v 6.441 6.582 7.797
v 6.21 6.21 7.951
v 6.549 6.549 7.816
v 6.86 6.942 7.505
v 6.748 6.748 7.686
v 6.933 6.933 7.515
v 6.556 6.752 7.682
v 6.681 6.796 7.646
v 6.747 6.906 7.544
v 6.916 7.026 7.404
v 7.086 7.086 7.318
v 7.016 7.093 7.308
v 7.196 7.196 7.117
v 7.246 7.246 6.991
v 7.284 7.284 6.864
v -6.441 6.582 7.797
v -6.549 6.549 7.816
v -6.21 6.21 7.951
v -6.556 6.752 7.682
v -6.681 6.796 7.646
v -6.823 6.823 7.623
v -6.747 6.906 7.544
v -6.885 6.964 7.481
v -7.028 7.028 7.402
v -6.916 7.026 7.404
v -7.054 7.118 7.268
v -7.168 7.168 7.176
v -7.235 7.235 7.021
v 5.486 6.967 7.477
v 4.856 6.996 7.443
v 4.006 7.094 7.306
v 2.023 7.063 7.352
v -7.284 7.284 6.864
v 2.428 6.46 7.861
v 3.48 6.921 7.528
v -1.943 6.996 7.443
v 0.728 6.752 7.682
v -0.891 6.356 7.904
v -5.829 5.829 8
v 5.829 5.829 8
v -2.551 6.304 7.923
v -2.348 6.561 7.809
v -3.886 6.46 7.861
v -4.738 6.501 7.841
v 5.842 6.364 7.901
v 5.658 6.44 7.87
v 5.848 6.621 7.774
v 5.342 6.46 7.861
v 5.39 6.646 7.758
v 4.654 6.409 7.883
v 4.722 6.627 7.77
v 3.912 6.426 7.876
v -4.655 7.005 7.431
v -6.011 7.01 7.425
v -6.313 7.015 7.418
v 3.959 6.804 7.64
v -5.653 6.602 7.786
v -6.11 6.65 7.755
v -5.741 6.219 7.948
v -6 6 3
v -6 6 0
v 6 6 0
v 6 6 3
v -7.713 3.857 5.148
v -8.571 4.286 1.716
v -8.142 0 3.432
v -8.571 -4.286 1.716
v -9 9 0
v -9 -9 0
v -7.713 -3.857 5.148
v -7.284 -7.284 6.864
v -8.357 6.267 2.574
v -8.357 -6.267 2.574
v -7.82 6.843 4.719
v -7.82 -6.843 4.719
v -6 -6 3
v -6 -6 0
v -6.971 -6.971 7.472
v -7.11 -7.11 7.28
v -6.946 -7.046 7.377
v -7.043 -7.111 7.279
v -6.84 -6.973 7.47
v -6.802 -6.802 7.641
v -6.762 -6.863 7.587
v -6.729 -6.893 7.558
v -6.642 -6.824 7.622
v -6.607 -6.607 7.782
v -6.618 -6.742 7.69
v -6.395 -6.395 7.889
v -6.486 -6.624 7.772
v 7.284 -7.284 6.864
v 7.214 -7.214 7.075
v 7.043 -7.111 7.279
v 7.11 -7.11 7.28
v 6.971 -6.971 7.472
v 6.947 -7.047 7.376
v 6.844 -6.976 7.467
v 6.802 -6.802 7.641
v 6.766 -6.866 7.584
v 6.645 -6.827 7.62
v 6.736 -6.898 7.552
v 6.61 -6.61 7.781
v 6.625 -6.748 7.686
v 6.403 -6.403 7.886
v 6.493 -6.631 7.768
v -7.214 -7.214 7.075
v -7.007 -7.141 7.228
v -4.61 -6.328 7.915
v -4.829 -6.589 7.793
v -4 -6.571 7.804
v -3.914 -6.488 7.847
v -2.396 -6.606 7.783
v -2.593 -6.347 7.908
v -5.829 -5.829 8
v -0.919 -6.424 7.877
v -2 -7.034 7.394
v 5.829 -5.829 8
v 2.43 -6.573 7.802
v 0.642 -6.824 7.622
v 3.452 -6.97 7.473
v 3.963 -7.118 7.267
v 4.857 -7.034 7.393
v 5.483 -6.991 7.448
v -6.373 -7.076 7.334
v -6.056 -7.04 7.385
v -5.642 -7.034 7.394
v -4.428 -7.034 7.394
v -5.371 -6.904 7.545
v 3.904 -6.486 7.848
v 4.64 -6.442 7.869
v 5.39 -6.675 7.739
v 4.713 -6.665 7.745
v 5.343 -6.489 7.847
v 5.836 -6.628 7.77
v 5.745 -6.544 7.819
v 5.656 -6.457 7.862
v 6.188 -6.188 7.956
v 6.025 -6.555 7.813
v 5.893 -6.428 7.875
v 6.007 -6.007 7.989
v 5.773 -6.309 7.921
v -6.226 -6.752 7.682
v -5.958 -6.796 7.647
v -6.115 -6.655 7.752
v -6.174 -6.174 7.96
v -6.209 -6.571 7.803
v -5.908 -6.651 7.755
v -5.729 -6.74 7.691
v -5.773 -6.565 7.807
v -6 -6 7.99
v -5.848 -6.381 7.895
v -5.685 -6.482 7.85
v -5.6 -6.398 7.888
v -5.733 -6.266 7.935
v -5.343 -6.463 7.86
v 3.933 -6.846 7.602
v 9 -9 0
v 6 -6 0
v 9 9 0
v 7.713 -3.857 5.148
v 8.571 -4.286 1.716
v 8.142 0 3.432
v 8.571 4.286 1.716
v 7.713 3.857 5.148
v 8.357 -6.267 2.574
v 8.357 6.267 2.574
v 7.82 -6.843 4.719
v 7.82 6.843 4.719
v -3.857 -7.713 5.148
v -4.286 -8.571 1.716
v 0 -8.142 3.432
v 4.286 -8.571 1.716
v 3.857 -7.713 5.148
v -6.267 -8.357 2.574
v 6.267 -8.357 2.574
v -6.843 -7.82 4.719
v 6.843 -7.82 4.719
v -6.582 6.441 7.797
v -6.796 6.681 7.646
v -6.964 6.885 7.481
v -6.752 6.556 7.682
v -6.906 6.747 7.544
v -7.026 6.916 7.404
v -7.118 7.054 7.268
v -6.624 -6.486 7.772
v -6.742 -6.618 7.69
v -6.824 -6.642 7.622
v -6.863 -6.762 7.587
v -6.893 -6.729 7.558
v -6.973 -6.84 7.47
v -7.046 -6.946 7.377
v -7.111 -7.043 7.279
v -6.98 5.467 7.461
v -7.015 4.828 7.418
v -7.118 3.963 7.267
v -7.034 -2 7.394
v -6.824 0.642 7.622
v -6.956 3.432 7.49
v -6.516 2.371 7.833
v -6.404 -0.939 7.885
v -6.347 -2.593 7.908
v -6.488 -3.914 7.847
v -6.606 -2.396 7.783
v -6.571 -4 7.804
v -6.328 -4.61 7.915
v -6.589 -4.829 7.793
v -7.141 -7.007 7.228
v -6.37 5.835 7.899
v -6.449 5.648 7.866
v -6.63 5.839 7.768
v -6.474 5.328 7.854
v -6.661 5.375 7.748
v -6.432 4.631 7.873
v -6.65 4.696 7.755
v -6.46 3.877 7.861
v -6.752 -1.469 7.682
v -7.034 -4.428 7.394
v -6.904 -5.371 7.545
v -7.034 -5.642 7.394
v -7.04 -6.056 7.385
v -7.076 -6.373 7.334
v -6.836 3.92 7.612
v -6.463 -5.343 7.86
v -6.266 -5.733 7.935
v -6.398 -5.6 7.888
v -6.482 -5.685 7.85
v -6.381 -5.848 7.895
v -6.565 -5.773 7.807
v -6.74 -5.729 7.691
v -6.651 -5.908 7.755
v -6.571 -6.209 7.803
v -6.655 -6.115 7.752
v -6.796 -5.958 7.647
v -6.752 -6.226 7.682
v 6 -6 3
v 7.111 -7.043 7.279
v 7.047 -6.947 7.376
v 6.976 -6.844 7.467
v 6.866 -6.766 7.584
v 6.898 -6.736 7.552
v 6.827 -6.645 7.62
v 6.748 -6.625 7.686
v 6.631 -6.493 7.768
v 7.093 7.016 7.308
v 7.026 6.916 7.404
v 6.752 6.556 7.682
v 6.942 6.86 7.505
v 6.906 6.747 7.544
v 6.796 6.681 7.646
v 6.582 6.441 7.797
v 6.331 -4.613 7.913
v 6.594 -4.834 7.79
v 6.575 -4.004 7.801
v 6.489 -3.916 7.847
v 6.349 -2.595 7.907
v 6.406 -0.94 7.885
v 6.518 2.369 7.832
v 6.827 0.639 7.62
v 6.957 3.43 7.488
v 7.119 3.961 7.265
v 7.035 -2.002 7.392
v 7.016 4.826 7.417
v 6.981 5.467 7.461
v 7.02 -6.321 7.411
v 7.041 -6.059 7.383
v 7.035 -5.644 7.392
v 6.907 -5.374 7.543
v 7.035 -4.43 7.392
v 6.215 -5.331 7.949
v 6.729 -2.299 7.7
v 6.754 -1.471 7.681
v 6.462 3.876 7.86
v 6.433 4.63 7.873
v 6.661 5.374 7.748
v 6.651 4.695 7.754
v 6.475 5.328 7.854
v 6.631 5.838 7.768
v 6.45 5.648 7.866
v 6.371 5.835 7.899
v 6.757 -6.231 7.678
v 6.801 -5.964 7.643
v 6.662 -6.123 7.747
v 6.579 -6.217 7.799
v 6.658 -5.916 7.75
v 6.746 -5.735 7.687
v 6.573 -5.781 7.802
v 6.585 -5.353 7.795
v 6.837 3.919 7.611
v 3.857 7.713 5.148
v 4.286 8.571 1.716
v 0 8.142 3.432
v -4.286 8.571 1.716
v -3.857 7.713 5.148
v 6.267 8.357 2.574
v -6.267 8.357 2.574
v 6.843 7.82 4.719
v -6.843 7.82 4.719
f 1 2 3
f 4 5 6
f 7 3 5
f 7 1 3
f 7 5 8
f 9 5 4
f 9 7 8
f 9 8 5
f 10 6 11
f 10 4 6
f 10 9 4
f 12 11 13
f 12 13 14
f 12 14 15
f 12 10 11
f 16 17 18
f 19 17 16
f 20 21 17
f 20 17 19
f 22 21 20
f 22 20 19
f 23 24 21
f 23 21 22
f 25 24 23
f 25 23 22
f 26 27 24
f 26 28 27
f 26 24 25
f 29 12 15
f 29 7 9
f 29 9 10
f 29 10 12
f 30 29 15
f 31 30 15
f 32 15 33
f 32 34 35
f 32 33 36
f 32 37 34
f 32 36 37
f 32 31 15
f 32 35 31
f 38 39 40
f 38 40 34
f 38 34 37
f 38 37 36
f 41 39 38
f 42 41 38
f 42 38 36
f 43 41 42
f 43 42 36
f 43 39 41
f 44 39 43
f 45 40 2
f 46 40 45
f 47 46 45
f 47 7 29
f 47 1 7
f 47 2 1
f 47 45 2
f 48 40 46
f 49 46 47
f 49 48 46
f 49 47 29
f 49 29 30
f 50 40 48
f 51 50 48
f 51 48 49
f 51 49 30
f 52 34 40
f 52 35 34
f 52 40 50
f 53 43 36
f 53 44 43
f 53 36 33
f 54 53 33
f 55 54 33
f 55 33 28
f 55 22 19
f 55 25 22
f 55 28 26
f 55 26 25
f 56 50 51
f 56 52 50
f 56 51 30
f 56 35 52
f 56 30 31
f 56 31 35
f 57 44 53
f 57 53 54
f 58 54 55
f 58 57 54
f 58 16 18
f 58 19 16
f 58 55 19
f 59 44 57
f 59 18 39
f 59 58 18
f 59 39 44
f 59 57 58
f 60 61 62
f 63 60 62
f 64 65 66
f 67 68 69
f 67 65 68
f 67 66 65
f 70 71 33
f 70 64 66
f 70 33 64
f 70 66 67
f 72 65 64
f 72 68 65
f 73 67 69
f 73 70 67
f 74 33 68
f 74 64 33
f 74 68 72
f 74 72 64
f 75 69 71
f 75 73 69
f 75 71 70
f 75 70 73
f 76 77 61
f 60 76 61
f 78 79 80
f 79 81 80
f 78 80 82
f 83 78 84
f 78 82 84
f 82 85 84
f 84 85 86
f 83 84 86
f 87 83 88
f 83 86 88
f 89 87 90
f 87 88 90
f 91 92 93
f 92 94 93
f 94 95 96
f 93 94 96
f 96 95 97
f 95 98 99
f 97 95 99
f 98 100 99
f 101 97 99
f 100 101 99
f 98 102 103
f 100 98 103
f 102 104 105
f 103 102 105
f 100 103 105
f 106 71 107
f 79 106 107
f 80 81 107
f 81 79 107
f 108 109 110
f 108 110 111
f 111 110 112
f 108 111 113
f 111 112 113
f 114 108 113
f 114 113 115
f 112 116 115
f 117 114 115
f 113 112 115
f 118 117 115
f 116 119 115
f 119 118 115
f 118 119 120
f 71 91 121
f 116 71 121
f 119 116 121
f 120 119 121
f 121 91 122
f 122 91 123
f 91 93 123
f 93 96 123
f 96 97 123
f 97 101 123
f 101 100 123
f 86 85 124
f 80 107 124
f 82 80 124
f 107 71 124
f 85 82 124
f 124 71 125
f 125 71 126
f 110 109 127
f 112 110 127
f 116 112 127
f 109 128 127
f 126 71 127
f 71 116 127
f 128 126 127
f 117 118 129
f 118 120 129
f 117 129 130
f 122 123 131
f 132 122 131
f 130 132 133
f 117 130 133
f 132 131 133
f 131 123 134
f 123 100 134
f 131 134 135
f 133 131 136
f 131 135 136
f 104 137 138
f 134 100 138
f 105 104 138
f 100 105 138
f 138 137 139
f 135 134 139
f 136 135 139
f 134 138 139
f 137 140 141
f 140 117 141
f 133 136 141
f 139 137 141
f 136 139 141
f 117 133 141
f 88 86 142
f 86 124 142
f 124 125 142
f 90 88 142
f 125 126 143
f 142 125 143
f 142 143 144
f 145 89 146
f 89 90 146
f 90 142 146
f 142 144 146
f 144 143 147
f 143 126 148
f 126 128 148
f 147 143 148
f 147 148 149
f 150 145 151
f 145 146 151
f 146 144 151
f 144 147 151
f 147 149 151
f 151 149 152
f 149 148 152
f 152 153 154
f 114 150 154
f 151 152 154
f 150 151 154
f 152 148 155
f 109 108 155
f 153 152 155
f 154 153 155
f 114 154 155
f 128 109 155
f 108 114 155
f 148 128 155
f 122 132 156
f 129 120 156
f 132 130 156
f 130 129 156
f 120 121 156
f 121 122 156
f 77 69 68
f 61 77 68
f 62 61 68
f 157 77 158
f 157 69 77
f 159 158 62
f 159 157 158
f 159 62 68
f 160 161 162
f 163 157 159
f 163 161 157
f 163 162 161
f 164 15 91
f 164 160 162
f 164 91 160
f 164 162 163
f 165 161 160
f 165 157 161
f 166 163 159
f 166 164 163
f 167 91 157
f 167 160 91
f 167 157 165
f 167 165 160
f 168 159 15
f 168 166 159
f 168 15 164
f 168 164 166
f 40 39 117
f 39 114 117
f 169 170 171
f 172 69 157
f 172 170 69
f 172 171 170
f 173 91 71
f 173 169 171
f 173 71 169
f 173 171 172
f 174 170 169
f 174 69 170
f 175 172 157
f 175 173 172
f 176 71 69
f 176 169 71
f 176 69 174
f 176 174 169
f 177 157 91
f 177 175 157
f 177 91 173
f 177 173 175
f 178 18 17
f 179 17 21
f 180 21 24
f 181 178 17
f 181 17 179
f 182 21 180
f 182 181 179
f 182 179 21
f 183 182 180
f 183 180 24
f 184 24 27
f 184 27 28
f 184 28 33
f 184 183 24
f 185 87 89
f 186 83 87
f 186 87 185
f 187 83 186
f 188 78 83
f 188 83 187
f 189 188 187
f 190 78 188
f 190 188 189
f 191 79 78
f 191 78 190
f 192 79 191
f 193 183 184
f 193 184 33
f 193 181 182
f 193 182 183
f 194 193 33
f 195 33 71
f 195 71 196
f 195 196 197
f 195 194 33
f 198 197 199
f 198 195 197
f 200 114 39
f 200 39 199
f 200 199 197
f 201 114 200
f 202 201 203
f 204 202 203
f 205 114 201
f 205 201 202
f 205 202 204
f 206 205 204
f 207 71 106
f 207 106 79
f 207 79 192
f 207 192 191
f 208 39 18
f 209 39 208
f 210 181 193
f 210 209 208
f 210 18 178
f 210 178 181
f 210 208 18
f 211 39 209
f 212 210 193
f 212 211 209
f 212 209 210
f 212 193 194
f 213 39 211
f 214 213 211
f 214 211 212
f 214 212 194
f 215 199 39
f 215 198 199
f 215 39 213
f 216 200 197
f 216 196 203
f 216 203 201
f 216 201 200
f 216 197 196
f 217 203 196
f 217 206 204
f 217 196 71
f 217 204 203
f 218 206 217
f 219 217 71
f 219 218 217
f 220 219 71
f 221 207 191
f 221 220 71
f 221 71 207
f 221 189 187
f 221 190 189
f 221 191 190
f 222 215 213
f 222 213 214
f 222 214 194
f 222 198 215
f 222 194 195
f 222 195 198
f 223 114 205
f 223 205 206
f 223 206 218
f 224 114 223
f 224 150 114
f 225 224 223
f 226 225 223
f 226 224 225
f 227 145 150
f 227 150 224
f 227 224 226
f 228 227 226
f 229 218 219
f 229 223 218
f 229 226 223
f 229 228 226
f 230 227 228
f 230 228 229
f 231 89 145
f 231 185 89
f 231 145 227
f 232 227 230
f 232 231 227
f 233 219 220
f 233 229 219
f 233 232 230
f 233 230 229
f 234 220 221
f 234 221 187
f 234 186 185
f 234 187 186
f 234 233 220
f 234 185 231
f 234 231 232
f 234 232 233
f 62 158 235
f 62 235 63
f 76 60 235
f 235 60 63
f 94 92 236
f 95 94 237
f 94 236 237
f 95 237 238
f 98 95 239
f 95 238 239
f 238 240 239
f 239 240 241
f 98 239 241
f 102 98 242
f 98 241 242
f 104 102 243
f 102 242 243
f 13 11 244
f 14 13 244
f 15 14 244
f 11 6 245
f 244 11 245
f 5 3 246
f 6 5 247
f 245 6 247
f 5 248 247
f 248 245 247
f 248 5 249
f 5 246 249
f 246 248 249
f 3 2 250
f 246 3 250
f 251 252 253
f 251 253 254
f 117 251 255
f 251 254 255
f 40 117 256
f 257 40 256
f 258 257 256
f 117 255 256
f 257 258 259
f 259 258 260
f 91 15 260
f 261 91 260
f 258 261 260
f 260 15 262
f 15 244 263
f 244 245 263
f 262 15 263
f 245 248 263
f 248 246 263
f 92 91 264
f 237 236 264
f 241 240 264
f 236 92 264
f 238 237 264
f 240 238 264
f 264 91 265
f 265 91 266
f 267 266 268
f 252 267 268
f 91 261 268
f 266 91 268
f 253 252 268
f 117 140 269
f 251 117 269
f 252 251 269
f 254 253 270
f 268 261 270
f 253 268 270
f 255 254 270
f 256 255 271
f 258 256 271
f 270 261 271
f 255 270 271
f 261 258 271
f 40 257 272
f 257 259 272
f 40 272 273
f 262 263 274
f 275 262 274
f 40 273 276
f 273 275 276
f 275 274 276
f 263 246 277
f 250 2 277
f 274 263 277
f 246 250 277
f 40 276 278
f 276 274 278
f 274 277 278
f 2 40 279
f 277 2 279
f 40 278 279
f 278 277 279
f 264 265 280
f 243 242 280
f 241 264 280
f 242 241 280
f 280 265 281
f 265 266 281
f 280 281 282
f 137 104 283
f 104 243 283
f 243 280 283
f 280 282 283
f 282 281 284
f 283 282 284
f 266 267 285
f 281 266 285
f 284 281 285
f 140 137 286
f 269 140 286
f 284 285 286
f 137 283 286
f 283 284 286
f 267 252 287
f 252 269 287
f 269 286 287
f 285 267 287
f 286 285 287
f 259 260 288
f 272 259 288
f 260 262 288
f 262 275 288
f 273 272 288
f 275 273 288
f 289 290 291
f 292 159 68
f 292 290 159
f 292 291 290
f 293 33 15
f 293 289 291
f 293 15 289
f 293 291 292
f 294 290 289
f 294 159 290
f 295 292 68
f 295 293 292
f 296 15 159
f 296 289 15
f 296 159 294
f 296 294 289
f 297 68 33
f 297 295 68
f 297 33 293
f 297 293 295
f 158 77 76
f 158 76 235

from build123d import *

# Parameters (mm, degrees)
SKETCH_3_W          = 12
SKETCH_3_H          = 12
CUT_EXTRUDE_1_DEPTH = 3
FILLET_1_R          = 1.5


with BuildPart() as part:
    # 草图1 → 放样1 section 0
    with BuildSketch(Plane.XY):
        with BuildLine():
            Line((-9, -9), (9, -9))
            Line((9, -9), (9, 9))
            Line((9, 9), (-9, 9))
            Line((-9, 9), (-9, -9))
        make_face()
    # 草图2 → 放样1 section 1
    with BuildSketch(Plane.XY.offset(8)):
        with BuildLine():
            Line((-7, -7), (7, -7))
            Line((7, -7), (7, 7))
            Line((7, 7), (-7, 7))
            Line((-7, 7), (-7, -7))
        make_face()
    loft()

    # 草图3 → 切除-拉伸1 (cut)
    with BuildSketch(Plane.XY):
        Rectangle(SKETCH_3_W, SKETCH_3_H)
    extrude(amount=CUT_EXTRUDE_1_DEPTH, mode=Mode.SUBTRACT)

    # 圆角1
    fillet_1_edges = [part.edges().sort_by_distance(p)[0] for p in [
        (0, 7, 8),
        (7, 0, 8),
        (0, -7, 8),
        (-7, 0, 8),
    ]]
    fillet(fillet_1_edges, radius=FILLET_1_R)


solid = part.part
